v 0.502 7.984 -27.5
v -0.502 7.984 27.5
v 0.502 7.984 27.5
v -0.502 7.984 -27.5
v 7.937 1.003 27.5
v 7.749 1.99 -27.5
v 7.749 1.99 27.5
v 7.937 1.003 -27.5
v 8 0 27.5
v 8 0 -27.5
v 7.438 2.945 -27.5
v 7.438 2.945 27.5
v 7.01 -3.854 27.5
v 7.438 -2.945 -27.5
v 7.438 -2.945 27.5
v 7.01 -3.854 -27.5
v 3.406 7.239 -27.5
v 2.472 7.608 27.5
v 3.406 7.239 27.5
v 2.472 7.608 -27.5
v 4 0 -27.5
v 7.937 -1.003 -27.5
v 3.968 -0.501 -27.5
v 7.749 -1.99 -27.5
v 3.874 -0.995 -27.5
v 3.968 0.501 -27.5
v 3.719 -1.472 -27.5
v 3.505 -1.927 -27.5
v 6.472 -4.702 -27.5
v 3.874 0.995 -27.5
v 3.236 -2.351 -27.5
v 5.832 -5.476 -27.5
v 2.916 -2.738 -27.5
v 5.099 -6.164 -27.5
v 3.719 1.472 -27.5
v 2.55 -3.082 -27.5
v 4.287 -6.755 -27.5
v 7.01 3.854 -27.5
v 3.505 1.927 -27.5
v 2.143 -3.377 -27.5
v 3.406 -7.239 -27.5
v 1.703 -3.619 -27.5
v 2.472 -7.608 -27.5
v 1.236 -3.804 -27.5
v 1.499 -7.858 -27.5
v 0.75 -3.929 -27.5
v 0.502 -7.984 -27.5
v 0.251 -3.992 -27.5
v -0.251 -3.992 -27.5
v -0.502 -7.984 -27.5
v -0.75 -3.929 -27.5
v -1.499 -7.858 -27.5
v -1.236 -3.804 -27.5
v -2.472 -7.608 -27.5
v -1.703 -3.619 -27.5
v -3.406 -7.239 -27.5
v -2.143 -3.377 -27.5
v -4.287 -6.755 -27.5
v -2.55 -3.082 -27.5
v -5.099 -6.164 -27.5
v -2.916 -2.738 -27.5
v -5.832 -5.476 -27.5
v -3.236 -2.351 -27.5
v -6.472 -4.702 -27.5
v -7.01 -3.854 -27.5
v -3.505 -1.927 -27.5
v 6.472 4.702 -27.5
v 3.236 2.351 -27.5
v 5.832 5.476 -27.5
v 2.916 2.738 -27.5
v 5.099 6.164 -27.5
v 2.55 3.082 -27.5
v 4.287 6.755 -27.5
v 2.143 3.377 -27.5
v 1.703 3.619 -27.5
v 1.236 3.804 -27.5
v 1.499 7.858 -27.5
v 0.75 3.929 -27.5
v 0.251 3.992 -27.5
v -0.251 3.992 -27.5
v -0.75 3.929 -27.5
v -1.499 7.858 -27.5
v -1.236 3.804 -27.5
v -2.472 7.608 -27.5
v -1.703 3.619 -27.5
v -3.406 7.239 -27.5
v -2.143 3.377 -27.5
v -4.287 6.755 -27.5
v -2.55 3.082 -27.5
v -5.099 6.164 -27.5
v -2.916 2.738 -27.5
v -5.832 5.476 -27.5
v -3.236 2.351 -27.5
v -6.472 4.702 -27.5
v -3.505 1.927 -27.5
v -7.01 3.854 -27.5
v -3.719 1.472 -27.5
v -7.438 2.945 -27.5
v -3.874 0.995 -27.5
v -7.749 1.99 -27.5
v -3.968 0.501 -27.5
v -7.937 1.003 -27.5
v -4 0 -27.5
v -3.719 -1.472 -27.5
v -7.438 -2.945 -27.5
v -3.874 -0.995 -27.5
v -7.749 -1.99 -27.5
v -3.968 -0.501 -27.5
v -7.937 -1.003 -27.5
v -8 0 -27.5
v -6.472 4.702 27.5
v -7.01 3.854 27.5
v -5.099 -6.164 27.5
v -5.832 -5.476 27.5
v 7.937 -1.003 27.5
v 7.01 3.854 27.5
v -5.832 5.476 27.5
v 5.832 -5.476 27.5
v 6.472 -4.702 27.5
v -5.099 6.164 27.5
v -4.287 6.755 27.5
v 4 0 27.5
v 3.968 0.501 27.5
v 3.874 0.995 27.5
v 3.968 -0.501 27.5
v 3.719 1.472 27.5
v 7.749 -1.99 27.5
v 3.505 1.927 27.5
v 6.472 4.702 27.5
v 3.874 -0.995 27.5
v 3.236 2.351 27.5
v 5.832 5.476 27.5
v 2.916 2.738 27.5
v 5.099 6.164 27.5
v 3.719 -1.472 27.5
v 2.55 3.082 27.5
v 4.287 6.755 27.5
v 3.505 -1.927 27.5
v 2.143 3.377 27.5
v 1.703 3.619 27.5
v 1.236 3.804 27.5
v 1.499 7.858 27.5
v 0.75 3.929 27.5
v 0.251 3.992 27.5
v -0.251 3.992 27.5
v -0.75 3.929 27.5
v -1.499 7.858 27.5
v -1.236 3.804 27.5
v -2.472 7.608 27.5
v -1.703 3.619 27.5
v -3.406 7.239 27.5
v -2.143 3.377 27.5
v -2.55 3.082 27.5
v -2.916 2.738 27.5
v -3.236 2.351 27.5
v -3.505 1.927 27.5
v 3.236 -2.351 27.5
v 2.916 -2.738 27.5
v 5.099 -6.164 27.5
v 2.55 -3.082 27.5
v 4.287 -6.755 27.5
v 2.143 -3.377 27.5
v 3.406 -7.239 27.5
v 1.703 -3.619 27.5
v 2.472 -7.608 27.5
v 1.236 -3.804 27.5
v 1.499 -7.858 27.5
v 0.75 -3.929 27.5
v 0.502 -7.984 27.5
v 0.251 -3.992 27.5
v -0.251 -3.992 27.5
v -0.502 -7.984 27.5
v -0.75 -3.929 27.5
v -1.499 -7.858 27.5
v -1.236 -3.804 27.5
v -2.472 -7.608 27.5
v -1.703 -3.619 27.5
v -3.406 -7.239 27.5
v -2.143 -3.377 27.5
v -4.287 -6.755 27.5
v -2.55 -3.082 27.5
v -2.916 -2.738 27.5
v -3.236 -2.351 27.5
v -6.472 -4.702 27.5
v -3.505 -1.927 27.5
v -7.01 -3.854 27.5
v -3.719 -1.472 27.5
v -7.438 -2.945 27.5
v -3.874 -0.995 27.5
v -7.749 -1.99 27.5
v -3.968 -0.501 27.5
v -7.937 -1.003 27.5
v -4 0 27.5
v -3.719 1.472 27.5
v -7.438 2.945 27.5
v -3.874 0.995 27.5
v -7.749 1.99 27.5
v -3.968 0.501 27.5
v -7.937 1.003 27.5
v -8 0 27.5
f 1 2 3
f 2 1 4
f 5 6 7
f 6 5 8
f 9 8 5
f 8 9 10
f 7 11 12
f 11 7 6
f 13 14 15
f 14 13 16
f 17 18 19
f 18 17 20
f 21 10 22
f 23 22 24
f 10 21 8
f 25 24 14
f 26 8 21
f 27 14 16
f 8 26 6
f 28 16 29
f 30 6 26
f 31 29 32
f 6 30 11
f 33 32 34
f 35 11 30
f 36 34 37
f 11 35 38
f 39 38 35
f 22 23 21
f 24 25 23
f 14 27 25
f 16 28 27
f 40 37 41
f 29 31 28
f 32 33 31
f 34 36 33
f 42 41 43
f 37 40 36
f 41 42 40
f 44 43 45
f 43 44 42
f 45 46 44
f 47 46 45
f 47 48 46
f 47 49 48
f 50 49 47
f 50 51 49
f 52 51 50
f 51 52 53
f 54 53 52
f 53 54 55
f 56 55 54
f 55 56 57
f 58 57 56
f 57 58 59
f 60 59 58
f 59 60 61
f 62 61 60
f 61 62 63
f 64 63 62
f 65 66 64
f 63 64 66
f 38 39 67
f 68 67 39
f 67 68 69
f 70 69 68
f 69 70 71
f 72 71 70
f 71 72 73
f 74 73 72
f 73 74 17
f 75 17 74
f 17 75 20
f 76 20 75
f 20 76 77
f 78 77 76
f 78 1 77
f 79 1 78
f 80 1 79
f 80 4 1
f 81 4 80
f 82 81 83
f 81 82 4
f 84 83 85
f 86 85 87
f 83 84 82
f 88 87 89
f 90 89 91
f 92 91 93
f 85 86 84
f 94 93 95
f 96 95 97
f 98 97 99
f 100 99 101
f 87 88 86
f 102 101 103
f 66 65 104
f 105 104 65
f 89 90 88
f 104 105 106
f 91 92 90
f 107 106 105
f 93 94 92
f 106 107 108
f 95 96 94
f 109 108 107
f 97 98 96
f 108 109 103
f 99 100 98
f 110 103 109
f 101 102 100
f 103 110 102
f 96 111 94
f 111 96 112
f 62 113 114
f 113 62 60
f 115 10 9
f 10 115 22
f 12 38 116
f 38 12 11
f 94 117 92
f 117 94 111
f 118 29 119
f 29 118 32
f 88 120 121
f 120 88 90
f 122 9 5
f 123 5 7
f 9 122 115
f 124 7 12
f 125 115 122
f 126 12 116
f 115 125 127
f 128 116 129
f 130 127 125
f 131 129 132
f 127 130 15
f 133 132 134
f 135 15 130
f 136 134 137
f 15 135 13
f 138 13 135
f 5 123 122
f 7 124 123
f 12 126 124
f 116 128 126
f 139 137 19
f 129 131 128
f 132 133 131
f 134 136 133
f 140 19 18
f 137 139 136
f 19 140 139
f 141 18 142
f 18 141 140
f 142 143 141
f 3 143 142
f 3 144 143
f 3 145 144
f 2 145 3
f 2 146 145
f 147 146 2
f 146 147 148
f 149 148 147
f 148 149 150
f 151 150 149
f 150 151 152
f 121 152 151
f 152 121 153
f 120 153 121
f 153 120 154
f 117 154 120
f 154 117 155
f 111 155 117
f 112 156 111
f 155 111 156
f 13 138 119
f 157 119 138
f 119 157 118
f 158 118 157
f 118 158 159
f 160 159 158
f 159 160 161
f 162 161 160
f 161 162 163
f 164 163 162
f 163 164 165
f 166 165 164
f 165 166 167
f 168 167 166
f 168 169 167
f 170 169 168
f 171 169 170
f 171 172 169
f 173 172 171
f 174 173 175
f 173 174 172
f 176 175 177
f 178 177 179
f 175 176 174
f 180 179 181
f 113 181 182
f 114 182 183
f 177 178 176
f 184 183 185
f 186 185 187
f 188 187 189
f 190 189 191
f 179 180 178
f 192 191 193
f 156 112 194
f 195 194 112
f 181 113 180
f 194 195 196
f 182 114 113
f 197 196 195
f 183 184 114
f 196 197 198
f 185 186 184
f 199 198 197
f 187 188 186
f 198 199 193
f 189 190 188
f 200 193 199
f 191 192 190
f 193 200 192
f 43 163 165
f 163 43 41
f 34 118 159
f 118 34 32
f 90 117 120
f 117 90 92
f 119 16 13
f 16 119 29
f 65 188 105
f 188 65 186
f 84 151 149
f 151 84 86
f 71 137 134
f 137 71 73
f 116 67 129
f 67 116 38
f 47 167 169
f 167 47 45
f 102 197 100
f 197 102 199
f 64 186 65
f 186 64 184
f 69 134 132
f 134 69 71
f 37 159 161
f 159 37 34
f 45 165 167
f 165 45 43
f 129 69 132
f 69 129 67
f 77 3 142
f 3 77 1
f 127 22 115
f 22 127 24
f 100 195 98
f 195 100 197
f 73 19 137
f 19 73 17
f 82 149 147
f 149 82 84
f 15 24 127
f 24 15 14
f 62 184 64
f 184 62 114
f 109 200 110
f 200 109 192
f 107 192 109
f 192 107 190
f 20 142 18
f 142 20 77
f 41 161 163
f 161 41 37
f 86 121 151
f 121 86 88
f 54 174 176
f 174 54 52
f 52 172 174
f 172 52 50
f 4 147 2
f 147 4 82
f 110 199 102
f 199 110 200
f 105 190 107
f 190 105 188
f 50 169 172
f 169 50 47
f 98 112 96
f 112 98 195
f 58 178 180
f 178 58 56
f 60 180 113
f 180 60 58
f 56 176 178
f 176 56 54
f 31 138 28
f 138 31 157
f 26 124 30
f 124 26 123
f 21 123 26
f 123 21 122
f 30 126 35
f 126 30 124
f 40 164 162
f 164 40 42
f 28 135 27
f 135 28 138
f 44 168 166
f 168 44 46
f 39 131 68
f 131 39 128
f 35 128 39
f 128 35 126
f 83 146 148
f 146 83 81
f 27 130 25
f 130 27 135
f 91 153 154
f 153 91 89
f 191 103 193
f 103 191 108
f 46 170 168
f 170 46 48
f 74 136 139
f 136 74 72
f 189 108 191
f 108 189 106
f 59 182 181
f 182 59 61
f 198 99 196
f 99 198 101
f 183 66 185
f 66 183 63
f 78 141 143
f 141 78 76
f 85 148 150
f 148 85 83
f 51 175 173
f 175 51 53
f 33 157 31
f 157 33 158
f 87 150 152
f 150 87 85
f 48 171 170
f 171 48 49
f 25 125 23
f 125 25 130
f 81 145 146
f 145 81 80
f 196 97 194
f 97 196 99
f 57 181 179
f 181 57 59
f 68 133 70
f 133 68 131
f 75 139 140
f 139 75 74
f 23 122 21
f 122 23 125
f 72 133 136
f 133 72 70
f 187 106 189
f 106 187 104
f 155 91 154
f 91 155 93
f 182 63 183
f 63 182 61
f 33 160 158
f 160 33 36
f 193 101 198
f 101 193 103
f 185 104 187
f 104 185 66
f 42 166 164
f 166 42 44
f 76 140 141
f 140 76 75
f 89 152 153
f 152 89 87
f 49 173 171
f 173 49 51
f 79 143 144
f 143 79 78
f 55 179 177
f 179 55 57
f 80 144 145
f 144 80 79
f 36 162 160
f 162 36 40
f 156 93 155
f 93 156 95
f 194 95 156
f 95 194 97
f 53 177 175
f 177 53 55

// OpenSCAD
$fn = 50;


difference() {
	union() {
		translate(v = [0, 0, -27.5000000000]) {
			cylinder(h = 55, r = 8.0000000000);
		}
	}
	union() {
		translate(v = [0, 0, -100.0000000000]) {
			cylinder(h = 200, r = 4.0000000000);
		}
	}
}
